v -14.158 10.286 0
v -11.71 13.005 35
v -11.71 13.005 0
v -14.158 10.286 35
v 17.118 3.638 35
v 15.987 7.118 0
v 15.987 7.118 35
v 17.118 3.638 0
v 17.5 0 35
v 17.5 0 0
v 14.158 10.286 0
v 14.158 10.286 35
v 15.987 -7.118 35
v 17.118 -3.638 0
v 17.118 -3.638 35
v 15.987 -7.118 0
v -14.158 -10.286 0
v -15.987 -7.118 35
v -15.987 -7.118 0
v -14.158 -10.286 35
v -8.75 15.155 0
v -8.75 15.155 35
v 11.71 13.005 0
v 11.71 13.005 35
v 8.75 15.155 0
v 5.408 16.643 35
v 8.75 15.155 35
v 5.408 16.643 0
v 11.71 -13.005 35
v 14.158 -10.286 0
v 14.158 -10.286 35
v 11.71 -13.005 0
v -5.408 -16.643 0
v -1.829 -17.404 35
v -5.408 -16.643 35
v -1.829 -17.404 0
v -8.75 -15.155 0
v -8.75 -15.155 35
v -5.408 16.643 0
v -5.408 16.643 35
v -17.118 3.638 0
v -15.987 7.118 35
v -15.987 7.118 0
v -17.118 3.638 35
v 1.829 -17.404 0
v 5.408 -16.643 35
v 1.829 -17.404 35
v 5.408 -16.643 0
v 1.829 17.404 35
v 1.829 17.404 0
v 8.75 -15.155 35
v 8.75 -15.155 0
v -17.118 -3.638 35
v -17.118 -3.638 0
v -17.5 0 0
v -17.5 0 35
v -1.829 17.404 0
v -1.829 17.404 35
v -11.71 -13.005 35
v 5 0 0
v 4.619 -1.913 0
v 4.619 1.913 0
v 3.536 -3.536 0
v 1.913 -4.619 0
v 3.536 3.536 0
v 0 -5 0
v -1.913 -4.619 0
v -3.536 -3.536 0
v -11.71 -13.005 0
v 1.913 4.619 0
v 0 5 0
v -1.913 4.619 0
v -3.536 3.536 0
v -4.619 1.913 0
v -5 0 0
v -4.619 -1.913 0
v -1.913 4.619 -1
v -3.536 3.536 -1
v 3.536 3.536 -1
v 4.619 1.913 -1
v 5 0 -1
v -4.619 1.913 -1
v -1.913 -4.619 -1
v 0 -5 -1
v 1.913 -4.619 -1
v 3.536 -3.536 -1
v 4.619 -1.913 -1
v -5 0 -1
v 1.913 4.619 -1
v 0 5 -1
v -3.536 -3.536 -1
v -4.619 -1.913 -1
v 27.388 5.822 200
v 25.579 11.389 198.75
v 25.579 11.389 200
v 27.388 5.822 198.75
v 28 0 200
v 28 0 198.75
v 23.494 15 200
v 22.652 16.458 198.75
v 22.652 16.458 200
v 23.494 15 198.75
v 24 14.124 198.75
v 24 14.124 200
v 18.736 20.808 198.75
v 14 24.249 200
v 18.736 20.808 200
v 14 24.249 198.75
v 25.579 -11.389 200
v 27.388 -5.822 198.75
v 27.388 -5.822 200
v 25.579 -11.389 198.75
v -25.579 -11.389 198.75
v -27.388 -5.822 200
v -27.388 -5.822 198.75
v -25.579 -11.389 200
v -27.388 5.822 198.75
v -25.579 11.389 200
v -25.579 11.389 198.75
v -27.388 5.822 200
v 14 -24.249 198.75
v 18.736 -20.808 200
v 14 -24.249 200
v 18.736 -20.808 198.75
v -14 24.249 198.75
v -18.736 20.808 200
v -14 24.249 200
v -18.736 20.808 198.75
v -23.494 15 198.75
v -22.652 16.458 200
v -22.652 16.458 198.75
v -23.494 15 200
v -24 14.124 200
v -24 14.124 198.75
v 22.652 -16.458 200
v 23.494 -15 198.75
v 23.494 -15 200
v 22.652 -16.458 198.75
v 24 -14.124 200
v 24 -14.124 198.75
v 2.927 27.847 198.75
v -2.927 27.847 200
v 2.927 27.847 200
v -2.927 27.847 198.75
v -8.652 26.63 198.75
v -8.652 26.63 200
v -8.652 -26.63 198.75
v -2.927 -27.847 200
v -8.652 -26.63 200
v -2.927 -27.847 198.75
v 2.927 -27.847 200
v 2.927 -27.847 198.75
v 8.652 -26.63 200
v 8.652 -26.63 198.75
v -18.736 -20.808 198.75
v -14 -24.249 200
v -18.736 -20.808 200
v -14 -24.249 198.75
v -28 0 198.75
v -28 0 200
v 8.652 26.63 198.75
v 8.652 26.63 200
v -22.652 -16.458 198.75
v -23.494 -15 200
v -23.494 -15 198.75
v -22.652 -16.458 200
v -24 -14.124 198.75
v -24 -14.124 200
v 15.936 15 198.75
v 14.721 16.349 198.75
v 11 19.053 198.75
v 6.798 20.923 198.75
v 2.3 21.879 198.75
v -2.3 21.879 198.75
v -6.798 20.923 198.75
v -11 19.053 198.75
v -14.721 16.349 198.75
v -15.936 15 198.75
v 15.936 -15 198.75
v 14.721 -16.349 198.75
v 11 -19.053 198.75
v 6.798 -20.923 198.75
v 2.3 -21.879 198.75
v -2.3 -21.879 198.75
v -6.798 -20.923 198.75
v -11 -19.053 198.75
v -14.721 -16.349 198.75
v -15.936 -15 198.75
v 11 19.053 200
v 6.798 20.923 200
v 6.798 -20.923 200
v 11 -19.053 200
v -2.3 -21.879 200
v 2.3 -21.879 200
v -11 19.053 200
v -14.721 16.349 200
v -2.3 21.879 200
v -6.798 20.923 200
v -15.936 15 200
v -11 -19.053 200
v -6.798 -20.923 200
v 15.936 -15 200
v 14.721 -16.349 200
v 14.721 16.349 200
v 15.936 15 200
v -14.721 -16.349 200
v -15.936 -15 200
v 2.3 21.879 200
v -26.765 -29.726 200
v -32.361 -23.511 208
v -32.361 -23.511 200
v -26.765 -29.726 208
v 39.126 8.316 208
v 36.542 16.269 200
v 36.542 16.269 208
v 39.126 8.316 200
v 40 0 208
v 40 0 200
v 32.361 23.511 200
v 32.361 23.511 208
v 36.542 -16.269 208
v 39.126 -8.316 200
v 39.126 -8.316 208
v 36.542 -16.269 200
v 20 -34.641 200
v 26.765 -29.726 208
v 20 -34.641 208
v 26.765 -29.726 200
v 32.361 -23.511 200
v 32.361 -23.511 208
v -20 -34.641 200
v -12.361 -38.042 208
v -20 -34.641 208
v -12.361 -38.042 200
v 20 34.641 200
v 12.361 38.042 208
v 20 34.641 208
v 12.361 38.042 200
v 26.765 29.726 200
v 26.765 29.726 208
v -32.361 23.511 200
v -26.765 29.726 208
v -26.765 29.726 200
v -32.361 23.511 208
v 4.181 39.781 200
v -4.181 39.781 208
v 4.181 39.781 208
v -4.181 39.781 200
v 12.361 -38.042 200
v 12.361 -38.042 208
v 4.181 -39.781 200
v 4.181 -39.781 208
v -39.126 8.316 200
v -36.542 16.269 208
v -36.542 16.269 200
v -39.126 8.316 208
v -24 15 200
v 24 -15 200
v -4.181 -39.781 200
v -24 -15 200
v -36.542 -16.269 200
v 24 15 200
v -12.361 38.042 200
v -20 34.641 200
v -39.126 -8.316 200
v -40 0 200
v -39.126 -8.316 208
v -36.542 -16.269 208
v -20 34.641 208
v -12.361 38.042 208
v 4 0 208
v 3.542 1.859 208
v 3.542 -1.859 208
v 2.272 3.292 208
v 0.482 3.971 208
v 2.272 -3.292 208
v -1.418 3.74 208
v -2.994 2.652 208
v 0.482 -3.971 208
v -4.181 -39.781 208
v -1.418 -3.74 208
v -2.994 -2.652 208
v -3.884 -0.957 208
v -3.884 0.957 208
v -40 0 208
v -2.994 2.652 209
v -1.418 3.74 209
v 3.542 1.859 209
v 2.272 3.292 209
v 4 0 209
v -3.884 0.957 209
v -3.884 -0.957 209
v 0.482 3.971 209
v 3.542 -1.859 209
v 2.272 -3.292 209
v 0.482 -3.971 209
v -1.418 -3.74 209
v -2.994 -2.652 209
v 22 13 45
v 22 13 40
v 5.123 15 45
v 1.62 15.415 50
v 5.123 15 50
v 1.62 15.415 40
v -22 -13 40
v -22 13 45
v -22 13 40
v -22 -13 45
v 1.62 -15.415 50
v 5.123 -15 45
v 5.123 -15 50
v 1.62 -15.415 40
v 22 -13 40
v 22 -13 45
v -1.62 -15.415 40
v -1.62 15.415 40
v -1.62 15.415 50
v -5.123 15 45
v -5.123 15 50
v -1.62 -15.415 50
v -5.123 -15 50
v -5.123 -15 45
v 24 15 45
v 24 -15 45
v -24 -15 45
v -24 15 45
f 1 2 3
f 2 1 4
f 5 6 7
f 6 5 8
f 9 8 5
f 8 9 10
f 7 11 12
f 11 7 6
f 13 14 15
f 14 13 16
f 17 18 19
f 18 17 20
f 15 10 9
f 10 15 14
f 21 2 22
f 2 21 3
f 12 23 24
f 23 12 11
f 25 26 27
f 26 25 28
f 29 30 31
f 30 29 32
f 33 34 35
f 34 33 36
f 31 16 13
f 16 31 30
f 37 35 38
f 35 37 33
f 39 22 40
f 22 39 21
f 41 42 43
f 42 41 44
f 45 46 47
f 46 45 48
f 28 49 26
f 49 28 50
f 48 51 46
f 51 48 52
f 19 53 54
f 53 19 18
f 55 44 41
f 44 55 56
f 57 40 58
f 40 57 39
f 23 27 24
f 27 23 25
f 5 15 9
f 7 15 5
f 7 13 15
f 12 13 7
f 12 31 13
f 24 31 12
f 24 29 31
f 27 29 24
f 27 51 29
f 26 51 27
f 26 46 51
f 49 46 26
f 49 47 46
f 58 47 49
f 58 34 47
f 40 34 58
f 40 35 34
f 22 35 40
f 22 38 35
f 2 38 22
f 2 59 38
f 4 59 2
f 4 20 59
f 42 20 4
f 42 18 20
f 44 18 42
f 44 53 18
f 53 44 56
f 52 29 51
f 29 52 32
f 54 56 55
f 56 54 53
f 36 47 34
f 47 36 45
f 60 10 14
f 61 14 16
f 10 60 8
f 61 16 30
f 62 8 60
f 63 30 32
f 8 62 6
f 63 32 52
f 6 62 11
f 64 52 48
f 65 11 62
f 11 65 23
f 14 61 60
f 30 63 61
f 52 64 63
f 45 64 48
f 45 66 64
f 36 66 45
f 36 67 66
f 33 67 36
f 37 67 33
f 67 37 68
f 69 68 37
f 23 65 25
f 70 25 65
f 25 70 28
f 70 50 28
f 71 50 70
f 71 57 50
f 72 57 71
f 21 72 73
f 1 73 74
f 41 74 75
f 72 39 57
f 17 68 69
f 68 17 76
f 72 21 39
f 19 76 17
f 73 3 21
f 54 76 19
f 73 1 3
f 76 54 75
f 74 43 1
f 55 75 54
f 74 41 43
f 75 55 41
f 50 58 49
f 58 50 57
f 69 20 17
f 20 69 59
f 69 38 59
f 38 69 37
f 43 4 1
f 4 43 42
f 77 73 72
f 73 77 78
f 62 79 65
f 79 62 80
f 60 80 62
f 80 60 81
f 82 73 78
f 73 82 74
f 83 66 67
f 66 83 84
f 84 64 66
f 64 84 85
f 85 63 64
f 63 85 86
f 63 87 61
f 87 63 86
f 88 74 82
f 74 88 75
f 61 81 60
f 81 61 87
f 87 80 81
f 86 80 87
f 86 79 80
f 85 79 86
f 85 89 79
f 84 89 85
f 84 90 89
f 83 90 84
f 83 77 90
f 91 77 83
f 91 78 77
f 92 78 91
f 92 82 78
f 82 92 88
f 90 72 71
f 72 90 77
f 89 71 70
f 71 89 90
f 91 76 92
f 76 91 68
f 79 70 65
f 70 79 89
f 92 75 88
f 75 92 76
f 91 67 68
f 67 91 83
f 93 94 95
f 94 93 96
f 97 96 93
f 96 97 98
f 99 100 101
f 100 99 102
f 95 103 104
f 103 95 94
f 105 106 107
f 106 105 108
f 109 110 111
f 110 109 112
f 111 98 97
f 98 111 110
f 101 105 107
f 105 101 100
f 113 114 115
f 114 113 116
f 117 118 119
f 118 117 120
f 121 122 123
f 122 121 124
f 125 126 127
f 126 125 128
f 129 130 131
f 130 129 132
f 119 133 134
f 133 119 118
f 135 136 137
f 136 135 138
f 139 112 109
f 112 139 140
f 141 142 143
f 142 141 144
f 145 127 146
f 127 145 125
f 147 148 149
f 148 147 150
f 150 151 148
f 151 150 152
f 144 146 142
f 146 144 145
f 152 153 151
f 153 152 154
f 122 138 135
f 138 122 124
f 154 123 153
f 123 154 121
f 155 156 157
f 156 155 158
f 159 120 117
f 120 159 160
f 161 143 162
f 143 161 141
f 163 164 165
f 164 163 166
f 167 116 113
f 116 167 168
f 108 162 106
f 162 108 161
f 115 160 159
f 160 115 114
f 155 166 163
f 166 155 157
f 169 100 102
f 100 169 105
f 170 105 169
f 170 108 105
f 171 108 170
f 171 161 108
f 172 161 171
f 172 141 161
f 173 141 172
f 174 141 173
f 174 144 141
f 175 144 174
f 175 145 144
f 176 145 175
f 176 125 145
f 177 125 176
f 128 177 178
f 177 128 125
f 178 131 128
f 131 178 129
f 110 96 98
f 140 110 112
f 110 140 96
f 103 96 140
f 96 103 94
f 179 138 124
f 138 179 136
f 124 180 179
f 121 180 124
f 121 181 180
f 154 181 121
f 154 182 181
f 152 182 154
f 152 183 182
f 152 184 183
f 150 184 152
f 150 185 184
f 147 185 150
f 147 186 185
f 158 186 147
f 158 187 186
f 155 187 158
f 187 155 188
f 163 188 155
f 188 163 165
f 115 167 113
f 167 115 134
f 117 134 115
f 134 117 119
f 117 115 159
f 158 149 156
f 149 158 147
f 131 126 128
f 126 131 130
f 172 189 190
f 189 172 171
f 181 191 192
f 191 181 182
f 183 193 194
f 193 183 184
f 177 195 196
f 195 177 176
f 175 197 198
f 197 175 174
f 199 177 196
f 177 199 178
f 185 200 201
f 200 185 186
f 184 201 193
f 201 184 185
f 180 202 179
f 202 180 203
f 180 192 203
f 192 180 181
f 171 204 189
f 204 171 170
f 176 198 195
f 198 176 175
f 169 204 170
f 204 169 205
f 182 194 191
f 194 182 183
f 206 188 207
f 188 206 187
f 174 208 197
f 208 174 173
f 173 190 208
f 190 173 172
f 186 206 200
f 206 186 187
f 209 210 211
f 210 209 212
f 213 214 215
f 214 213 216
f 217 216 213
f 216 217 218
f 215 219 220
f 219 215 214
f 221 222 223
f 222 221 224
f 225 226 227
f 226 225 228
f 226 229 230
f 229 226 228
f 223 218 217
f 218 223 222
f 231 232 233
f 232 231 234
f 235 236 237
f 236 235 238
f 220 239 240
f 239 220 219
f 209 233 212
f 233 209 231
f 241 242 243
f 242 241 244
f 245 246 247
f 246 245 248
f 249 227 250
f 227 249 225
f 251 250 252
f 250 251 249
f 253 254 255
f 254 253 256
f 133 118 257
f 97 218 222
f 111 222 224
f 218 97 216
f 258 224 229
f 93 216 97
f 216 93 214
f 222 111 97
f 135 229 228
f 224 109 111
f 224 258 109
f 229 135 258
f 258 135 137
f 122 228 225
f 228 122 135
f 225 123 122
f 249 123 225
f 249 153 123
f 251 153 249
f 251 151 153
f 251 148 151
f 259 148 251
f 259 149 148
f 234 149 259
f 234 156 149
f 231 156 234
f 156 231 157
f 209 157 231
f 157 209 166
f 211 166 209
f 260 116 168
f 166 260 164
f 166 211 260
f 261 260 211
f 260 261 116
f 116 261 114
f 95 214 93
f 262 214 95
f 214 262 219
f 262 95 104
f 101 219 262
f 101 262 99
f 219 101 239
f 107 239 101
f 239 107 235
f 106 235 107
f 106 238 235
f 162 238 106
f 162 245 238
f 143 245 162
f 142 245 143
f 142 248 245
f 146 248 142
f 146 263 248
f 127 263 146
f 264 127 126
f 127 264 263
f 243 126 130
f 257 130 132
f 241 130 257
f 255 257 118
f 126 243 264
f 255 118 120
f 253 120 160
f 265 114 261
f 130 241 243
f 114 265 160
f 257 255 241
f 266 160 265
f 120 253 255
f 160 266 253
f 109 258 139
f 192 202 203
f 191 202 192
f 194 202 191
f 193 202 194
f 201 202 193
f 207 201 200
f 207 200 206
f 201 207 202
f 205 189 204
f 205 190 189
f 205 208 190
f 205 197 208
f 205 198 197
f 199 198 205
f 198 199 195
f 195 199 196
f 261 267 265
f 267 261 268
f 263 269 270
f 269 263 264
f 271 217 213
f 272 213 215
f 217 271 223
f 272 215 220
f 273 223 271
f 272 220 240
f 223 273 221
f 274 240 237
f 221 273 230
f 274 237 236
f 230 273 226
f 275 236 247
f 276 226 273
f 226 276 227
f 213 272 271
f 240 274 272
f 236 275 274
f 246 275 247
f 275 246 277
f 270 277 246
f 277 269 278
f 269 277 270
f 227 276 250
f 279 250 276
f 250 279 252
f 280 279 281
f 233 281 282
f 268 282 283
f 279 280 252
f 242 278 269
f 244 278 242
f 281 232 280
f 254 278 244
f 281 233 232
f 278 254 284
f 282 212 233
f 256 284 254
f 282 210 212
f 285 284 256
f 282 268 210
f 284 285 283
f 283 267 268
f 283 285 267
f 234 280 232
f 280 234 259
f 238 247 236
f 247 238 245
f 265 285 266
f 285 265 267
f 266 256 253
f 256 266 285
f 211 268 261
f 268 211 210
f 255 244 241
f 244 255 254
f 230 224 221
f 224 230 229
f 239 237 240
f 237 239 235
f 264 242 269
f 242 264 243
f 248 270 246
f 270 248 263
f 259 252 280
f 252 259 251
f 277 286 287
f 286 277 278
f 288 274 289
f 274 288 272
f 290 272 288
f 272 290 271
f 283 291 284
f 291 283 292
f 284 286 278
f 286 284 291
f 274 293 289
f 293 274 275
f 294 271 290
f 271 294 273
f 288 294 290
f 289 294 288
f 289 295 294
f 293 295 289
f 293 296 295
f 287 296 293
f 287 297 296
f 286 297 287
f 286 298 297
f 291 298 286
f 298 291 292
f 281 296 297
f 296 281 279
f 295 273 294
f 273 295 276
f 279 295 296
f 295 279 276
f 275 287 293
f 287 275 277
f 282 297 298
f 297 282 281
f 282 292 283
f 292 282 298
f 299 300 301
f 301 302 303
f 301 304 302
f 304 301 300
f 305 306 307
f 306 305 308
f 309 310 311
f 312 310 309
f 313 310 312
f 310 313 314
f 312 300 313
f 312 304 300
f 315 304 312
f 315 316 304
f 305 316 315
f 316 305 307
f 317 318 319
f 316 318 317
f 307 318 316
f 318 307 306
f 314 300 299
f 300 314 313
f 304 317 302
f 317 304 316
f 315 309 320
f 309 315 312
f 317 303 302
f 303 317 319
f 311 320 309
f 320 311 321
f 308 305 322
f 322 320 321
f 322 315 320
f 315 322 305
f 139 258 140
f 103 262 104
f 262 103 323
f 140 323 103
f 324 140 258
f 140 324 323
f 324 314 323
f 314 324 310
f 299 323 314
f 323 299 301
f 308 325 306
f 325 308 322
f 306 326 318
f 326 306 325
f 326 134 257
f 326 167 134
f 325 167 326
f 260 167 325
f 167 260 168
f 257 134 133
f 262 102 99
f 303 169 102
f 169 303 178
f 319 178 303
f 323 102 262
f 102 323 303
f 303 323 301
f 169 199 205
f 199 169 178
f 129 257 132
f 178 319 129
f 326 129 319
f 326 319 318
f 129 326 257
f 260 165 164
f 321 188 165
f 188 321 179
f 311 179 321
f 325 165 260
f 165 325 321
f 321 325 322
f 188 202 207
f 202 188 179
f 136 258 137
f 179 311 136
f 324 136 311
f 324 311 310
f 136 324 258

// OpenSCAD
// MYLLÄRI Beer Tap Handle - Simple Version
// For Bambu Lab 3D Printing
// This version works without font dependencies

// Dimensions
disk_d = 80;
disk_t = 8;
shaft_h = 155;
shaft_w = 48;
shaft_t = 30;
neck_h = 10;
base_h = 35;
base_d = 35;
keyway_w = 20;
keyway_d = 5;

// Base
translate([0, 0, base_h/2]) {
    cylinder(r = base_d/2, h = base_h, center=true);
    // Nut hole
    translate([0, 0, -base_h/2+3]) cylinder(r=5, h=8, center=true);
}

// Neck
translate([0, 0, base_h + neck_h/2]) {
    linear_extrude(height=neck_h) hull() {
        square([shaft_w-4, shaft_t-4], center=true);
        circle(r=base_d/2-2);
    }
}

// Shaft
translate([0, 0, base_h + neck_h + shaft_h/2]) {
    cube([shaft_w, shaft_t, shaft_h], center=true);
}

// Keyway slot
translate([0, 0, base_h + neck_h + shaft_h + keyway_d/2]) {
    cube([keyway_w, shaft_t, keyway_d], center=true);
}

// Top Disk
translate([0, 0, base_h + neck_h + shaft_h + disk_t/2]) {
    cylinder(r=disk_d/2, h=disk_t, center=true);
    cylinder(r=4, h=disk_t+2, center=true); // screw hole
    // Protrusion
    translate([0, 0, -disk_t/2]) cube([keyway_w-0.3, keyway_w-0.3, 4], center=true);
    // Flavor circle
    translate([0, 0, -disk_t/2-0.5]) difference() {
        cylinder(r=disk_d/2-12, h=1.5, center=true);
        cylinder(r=disk_d/2-18, h=3, center=true);
    }
}
